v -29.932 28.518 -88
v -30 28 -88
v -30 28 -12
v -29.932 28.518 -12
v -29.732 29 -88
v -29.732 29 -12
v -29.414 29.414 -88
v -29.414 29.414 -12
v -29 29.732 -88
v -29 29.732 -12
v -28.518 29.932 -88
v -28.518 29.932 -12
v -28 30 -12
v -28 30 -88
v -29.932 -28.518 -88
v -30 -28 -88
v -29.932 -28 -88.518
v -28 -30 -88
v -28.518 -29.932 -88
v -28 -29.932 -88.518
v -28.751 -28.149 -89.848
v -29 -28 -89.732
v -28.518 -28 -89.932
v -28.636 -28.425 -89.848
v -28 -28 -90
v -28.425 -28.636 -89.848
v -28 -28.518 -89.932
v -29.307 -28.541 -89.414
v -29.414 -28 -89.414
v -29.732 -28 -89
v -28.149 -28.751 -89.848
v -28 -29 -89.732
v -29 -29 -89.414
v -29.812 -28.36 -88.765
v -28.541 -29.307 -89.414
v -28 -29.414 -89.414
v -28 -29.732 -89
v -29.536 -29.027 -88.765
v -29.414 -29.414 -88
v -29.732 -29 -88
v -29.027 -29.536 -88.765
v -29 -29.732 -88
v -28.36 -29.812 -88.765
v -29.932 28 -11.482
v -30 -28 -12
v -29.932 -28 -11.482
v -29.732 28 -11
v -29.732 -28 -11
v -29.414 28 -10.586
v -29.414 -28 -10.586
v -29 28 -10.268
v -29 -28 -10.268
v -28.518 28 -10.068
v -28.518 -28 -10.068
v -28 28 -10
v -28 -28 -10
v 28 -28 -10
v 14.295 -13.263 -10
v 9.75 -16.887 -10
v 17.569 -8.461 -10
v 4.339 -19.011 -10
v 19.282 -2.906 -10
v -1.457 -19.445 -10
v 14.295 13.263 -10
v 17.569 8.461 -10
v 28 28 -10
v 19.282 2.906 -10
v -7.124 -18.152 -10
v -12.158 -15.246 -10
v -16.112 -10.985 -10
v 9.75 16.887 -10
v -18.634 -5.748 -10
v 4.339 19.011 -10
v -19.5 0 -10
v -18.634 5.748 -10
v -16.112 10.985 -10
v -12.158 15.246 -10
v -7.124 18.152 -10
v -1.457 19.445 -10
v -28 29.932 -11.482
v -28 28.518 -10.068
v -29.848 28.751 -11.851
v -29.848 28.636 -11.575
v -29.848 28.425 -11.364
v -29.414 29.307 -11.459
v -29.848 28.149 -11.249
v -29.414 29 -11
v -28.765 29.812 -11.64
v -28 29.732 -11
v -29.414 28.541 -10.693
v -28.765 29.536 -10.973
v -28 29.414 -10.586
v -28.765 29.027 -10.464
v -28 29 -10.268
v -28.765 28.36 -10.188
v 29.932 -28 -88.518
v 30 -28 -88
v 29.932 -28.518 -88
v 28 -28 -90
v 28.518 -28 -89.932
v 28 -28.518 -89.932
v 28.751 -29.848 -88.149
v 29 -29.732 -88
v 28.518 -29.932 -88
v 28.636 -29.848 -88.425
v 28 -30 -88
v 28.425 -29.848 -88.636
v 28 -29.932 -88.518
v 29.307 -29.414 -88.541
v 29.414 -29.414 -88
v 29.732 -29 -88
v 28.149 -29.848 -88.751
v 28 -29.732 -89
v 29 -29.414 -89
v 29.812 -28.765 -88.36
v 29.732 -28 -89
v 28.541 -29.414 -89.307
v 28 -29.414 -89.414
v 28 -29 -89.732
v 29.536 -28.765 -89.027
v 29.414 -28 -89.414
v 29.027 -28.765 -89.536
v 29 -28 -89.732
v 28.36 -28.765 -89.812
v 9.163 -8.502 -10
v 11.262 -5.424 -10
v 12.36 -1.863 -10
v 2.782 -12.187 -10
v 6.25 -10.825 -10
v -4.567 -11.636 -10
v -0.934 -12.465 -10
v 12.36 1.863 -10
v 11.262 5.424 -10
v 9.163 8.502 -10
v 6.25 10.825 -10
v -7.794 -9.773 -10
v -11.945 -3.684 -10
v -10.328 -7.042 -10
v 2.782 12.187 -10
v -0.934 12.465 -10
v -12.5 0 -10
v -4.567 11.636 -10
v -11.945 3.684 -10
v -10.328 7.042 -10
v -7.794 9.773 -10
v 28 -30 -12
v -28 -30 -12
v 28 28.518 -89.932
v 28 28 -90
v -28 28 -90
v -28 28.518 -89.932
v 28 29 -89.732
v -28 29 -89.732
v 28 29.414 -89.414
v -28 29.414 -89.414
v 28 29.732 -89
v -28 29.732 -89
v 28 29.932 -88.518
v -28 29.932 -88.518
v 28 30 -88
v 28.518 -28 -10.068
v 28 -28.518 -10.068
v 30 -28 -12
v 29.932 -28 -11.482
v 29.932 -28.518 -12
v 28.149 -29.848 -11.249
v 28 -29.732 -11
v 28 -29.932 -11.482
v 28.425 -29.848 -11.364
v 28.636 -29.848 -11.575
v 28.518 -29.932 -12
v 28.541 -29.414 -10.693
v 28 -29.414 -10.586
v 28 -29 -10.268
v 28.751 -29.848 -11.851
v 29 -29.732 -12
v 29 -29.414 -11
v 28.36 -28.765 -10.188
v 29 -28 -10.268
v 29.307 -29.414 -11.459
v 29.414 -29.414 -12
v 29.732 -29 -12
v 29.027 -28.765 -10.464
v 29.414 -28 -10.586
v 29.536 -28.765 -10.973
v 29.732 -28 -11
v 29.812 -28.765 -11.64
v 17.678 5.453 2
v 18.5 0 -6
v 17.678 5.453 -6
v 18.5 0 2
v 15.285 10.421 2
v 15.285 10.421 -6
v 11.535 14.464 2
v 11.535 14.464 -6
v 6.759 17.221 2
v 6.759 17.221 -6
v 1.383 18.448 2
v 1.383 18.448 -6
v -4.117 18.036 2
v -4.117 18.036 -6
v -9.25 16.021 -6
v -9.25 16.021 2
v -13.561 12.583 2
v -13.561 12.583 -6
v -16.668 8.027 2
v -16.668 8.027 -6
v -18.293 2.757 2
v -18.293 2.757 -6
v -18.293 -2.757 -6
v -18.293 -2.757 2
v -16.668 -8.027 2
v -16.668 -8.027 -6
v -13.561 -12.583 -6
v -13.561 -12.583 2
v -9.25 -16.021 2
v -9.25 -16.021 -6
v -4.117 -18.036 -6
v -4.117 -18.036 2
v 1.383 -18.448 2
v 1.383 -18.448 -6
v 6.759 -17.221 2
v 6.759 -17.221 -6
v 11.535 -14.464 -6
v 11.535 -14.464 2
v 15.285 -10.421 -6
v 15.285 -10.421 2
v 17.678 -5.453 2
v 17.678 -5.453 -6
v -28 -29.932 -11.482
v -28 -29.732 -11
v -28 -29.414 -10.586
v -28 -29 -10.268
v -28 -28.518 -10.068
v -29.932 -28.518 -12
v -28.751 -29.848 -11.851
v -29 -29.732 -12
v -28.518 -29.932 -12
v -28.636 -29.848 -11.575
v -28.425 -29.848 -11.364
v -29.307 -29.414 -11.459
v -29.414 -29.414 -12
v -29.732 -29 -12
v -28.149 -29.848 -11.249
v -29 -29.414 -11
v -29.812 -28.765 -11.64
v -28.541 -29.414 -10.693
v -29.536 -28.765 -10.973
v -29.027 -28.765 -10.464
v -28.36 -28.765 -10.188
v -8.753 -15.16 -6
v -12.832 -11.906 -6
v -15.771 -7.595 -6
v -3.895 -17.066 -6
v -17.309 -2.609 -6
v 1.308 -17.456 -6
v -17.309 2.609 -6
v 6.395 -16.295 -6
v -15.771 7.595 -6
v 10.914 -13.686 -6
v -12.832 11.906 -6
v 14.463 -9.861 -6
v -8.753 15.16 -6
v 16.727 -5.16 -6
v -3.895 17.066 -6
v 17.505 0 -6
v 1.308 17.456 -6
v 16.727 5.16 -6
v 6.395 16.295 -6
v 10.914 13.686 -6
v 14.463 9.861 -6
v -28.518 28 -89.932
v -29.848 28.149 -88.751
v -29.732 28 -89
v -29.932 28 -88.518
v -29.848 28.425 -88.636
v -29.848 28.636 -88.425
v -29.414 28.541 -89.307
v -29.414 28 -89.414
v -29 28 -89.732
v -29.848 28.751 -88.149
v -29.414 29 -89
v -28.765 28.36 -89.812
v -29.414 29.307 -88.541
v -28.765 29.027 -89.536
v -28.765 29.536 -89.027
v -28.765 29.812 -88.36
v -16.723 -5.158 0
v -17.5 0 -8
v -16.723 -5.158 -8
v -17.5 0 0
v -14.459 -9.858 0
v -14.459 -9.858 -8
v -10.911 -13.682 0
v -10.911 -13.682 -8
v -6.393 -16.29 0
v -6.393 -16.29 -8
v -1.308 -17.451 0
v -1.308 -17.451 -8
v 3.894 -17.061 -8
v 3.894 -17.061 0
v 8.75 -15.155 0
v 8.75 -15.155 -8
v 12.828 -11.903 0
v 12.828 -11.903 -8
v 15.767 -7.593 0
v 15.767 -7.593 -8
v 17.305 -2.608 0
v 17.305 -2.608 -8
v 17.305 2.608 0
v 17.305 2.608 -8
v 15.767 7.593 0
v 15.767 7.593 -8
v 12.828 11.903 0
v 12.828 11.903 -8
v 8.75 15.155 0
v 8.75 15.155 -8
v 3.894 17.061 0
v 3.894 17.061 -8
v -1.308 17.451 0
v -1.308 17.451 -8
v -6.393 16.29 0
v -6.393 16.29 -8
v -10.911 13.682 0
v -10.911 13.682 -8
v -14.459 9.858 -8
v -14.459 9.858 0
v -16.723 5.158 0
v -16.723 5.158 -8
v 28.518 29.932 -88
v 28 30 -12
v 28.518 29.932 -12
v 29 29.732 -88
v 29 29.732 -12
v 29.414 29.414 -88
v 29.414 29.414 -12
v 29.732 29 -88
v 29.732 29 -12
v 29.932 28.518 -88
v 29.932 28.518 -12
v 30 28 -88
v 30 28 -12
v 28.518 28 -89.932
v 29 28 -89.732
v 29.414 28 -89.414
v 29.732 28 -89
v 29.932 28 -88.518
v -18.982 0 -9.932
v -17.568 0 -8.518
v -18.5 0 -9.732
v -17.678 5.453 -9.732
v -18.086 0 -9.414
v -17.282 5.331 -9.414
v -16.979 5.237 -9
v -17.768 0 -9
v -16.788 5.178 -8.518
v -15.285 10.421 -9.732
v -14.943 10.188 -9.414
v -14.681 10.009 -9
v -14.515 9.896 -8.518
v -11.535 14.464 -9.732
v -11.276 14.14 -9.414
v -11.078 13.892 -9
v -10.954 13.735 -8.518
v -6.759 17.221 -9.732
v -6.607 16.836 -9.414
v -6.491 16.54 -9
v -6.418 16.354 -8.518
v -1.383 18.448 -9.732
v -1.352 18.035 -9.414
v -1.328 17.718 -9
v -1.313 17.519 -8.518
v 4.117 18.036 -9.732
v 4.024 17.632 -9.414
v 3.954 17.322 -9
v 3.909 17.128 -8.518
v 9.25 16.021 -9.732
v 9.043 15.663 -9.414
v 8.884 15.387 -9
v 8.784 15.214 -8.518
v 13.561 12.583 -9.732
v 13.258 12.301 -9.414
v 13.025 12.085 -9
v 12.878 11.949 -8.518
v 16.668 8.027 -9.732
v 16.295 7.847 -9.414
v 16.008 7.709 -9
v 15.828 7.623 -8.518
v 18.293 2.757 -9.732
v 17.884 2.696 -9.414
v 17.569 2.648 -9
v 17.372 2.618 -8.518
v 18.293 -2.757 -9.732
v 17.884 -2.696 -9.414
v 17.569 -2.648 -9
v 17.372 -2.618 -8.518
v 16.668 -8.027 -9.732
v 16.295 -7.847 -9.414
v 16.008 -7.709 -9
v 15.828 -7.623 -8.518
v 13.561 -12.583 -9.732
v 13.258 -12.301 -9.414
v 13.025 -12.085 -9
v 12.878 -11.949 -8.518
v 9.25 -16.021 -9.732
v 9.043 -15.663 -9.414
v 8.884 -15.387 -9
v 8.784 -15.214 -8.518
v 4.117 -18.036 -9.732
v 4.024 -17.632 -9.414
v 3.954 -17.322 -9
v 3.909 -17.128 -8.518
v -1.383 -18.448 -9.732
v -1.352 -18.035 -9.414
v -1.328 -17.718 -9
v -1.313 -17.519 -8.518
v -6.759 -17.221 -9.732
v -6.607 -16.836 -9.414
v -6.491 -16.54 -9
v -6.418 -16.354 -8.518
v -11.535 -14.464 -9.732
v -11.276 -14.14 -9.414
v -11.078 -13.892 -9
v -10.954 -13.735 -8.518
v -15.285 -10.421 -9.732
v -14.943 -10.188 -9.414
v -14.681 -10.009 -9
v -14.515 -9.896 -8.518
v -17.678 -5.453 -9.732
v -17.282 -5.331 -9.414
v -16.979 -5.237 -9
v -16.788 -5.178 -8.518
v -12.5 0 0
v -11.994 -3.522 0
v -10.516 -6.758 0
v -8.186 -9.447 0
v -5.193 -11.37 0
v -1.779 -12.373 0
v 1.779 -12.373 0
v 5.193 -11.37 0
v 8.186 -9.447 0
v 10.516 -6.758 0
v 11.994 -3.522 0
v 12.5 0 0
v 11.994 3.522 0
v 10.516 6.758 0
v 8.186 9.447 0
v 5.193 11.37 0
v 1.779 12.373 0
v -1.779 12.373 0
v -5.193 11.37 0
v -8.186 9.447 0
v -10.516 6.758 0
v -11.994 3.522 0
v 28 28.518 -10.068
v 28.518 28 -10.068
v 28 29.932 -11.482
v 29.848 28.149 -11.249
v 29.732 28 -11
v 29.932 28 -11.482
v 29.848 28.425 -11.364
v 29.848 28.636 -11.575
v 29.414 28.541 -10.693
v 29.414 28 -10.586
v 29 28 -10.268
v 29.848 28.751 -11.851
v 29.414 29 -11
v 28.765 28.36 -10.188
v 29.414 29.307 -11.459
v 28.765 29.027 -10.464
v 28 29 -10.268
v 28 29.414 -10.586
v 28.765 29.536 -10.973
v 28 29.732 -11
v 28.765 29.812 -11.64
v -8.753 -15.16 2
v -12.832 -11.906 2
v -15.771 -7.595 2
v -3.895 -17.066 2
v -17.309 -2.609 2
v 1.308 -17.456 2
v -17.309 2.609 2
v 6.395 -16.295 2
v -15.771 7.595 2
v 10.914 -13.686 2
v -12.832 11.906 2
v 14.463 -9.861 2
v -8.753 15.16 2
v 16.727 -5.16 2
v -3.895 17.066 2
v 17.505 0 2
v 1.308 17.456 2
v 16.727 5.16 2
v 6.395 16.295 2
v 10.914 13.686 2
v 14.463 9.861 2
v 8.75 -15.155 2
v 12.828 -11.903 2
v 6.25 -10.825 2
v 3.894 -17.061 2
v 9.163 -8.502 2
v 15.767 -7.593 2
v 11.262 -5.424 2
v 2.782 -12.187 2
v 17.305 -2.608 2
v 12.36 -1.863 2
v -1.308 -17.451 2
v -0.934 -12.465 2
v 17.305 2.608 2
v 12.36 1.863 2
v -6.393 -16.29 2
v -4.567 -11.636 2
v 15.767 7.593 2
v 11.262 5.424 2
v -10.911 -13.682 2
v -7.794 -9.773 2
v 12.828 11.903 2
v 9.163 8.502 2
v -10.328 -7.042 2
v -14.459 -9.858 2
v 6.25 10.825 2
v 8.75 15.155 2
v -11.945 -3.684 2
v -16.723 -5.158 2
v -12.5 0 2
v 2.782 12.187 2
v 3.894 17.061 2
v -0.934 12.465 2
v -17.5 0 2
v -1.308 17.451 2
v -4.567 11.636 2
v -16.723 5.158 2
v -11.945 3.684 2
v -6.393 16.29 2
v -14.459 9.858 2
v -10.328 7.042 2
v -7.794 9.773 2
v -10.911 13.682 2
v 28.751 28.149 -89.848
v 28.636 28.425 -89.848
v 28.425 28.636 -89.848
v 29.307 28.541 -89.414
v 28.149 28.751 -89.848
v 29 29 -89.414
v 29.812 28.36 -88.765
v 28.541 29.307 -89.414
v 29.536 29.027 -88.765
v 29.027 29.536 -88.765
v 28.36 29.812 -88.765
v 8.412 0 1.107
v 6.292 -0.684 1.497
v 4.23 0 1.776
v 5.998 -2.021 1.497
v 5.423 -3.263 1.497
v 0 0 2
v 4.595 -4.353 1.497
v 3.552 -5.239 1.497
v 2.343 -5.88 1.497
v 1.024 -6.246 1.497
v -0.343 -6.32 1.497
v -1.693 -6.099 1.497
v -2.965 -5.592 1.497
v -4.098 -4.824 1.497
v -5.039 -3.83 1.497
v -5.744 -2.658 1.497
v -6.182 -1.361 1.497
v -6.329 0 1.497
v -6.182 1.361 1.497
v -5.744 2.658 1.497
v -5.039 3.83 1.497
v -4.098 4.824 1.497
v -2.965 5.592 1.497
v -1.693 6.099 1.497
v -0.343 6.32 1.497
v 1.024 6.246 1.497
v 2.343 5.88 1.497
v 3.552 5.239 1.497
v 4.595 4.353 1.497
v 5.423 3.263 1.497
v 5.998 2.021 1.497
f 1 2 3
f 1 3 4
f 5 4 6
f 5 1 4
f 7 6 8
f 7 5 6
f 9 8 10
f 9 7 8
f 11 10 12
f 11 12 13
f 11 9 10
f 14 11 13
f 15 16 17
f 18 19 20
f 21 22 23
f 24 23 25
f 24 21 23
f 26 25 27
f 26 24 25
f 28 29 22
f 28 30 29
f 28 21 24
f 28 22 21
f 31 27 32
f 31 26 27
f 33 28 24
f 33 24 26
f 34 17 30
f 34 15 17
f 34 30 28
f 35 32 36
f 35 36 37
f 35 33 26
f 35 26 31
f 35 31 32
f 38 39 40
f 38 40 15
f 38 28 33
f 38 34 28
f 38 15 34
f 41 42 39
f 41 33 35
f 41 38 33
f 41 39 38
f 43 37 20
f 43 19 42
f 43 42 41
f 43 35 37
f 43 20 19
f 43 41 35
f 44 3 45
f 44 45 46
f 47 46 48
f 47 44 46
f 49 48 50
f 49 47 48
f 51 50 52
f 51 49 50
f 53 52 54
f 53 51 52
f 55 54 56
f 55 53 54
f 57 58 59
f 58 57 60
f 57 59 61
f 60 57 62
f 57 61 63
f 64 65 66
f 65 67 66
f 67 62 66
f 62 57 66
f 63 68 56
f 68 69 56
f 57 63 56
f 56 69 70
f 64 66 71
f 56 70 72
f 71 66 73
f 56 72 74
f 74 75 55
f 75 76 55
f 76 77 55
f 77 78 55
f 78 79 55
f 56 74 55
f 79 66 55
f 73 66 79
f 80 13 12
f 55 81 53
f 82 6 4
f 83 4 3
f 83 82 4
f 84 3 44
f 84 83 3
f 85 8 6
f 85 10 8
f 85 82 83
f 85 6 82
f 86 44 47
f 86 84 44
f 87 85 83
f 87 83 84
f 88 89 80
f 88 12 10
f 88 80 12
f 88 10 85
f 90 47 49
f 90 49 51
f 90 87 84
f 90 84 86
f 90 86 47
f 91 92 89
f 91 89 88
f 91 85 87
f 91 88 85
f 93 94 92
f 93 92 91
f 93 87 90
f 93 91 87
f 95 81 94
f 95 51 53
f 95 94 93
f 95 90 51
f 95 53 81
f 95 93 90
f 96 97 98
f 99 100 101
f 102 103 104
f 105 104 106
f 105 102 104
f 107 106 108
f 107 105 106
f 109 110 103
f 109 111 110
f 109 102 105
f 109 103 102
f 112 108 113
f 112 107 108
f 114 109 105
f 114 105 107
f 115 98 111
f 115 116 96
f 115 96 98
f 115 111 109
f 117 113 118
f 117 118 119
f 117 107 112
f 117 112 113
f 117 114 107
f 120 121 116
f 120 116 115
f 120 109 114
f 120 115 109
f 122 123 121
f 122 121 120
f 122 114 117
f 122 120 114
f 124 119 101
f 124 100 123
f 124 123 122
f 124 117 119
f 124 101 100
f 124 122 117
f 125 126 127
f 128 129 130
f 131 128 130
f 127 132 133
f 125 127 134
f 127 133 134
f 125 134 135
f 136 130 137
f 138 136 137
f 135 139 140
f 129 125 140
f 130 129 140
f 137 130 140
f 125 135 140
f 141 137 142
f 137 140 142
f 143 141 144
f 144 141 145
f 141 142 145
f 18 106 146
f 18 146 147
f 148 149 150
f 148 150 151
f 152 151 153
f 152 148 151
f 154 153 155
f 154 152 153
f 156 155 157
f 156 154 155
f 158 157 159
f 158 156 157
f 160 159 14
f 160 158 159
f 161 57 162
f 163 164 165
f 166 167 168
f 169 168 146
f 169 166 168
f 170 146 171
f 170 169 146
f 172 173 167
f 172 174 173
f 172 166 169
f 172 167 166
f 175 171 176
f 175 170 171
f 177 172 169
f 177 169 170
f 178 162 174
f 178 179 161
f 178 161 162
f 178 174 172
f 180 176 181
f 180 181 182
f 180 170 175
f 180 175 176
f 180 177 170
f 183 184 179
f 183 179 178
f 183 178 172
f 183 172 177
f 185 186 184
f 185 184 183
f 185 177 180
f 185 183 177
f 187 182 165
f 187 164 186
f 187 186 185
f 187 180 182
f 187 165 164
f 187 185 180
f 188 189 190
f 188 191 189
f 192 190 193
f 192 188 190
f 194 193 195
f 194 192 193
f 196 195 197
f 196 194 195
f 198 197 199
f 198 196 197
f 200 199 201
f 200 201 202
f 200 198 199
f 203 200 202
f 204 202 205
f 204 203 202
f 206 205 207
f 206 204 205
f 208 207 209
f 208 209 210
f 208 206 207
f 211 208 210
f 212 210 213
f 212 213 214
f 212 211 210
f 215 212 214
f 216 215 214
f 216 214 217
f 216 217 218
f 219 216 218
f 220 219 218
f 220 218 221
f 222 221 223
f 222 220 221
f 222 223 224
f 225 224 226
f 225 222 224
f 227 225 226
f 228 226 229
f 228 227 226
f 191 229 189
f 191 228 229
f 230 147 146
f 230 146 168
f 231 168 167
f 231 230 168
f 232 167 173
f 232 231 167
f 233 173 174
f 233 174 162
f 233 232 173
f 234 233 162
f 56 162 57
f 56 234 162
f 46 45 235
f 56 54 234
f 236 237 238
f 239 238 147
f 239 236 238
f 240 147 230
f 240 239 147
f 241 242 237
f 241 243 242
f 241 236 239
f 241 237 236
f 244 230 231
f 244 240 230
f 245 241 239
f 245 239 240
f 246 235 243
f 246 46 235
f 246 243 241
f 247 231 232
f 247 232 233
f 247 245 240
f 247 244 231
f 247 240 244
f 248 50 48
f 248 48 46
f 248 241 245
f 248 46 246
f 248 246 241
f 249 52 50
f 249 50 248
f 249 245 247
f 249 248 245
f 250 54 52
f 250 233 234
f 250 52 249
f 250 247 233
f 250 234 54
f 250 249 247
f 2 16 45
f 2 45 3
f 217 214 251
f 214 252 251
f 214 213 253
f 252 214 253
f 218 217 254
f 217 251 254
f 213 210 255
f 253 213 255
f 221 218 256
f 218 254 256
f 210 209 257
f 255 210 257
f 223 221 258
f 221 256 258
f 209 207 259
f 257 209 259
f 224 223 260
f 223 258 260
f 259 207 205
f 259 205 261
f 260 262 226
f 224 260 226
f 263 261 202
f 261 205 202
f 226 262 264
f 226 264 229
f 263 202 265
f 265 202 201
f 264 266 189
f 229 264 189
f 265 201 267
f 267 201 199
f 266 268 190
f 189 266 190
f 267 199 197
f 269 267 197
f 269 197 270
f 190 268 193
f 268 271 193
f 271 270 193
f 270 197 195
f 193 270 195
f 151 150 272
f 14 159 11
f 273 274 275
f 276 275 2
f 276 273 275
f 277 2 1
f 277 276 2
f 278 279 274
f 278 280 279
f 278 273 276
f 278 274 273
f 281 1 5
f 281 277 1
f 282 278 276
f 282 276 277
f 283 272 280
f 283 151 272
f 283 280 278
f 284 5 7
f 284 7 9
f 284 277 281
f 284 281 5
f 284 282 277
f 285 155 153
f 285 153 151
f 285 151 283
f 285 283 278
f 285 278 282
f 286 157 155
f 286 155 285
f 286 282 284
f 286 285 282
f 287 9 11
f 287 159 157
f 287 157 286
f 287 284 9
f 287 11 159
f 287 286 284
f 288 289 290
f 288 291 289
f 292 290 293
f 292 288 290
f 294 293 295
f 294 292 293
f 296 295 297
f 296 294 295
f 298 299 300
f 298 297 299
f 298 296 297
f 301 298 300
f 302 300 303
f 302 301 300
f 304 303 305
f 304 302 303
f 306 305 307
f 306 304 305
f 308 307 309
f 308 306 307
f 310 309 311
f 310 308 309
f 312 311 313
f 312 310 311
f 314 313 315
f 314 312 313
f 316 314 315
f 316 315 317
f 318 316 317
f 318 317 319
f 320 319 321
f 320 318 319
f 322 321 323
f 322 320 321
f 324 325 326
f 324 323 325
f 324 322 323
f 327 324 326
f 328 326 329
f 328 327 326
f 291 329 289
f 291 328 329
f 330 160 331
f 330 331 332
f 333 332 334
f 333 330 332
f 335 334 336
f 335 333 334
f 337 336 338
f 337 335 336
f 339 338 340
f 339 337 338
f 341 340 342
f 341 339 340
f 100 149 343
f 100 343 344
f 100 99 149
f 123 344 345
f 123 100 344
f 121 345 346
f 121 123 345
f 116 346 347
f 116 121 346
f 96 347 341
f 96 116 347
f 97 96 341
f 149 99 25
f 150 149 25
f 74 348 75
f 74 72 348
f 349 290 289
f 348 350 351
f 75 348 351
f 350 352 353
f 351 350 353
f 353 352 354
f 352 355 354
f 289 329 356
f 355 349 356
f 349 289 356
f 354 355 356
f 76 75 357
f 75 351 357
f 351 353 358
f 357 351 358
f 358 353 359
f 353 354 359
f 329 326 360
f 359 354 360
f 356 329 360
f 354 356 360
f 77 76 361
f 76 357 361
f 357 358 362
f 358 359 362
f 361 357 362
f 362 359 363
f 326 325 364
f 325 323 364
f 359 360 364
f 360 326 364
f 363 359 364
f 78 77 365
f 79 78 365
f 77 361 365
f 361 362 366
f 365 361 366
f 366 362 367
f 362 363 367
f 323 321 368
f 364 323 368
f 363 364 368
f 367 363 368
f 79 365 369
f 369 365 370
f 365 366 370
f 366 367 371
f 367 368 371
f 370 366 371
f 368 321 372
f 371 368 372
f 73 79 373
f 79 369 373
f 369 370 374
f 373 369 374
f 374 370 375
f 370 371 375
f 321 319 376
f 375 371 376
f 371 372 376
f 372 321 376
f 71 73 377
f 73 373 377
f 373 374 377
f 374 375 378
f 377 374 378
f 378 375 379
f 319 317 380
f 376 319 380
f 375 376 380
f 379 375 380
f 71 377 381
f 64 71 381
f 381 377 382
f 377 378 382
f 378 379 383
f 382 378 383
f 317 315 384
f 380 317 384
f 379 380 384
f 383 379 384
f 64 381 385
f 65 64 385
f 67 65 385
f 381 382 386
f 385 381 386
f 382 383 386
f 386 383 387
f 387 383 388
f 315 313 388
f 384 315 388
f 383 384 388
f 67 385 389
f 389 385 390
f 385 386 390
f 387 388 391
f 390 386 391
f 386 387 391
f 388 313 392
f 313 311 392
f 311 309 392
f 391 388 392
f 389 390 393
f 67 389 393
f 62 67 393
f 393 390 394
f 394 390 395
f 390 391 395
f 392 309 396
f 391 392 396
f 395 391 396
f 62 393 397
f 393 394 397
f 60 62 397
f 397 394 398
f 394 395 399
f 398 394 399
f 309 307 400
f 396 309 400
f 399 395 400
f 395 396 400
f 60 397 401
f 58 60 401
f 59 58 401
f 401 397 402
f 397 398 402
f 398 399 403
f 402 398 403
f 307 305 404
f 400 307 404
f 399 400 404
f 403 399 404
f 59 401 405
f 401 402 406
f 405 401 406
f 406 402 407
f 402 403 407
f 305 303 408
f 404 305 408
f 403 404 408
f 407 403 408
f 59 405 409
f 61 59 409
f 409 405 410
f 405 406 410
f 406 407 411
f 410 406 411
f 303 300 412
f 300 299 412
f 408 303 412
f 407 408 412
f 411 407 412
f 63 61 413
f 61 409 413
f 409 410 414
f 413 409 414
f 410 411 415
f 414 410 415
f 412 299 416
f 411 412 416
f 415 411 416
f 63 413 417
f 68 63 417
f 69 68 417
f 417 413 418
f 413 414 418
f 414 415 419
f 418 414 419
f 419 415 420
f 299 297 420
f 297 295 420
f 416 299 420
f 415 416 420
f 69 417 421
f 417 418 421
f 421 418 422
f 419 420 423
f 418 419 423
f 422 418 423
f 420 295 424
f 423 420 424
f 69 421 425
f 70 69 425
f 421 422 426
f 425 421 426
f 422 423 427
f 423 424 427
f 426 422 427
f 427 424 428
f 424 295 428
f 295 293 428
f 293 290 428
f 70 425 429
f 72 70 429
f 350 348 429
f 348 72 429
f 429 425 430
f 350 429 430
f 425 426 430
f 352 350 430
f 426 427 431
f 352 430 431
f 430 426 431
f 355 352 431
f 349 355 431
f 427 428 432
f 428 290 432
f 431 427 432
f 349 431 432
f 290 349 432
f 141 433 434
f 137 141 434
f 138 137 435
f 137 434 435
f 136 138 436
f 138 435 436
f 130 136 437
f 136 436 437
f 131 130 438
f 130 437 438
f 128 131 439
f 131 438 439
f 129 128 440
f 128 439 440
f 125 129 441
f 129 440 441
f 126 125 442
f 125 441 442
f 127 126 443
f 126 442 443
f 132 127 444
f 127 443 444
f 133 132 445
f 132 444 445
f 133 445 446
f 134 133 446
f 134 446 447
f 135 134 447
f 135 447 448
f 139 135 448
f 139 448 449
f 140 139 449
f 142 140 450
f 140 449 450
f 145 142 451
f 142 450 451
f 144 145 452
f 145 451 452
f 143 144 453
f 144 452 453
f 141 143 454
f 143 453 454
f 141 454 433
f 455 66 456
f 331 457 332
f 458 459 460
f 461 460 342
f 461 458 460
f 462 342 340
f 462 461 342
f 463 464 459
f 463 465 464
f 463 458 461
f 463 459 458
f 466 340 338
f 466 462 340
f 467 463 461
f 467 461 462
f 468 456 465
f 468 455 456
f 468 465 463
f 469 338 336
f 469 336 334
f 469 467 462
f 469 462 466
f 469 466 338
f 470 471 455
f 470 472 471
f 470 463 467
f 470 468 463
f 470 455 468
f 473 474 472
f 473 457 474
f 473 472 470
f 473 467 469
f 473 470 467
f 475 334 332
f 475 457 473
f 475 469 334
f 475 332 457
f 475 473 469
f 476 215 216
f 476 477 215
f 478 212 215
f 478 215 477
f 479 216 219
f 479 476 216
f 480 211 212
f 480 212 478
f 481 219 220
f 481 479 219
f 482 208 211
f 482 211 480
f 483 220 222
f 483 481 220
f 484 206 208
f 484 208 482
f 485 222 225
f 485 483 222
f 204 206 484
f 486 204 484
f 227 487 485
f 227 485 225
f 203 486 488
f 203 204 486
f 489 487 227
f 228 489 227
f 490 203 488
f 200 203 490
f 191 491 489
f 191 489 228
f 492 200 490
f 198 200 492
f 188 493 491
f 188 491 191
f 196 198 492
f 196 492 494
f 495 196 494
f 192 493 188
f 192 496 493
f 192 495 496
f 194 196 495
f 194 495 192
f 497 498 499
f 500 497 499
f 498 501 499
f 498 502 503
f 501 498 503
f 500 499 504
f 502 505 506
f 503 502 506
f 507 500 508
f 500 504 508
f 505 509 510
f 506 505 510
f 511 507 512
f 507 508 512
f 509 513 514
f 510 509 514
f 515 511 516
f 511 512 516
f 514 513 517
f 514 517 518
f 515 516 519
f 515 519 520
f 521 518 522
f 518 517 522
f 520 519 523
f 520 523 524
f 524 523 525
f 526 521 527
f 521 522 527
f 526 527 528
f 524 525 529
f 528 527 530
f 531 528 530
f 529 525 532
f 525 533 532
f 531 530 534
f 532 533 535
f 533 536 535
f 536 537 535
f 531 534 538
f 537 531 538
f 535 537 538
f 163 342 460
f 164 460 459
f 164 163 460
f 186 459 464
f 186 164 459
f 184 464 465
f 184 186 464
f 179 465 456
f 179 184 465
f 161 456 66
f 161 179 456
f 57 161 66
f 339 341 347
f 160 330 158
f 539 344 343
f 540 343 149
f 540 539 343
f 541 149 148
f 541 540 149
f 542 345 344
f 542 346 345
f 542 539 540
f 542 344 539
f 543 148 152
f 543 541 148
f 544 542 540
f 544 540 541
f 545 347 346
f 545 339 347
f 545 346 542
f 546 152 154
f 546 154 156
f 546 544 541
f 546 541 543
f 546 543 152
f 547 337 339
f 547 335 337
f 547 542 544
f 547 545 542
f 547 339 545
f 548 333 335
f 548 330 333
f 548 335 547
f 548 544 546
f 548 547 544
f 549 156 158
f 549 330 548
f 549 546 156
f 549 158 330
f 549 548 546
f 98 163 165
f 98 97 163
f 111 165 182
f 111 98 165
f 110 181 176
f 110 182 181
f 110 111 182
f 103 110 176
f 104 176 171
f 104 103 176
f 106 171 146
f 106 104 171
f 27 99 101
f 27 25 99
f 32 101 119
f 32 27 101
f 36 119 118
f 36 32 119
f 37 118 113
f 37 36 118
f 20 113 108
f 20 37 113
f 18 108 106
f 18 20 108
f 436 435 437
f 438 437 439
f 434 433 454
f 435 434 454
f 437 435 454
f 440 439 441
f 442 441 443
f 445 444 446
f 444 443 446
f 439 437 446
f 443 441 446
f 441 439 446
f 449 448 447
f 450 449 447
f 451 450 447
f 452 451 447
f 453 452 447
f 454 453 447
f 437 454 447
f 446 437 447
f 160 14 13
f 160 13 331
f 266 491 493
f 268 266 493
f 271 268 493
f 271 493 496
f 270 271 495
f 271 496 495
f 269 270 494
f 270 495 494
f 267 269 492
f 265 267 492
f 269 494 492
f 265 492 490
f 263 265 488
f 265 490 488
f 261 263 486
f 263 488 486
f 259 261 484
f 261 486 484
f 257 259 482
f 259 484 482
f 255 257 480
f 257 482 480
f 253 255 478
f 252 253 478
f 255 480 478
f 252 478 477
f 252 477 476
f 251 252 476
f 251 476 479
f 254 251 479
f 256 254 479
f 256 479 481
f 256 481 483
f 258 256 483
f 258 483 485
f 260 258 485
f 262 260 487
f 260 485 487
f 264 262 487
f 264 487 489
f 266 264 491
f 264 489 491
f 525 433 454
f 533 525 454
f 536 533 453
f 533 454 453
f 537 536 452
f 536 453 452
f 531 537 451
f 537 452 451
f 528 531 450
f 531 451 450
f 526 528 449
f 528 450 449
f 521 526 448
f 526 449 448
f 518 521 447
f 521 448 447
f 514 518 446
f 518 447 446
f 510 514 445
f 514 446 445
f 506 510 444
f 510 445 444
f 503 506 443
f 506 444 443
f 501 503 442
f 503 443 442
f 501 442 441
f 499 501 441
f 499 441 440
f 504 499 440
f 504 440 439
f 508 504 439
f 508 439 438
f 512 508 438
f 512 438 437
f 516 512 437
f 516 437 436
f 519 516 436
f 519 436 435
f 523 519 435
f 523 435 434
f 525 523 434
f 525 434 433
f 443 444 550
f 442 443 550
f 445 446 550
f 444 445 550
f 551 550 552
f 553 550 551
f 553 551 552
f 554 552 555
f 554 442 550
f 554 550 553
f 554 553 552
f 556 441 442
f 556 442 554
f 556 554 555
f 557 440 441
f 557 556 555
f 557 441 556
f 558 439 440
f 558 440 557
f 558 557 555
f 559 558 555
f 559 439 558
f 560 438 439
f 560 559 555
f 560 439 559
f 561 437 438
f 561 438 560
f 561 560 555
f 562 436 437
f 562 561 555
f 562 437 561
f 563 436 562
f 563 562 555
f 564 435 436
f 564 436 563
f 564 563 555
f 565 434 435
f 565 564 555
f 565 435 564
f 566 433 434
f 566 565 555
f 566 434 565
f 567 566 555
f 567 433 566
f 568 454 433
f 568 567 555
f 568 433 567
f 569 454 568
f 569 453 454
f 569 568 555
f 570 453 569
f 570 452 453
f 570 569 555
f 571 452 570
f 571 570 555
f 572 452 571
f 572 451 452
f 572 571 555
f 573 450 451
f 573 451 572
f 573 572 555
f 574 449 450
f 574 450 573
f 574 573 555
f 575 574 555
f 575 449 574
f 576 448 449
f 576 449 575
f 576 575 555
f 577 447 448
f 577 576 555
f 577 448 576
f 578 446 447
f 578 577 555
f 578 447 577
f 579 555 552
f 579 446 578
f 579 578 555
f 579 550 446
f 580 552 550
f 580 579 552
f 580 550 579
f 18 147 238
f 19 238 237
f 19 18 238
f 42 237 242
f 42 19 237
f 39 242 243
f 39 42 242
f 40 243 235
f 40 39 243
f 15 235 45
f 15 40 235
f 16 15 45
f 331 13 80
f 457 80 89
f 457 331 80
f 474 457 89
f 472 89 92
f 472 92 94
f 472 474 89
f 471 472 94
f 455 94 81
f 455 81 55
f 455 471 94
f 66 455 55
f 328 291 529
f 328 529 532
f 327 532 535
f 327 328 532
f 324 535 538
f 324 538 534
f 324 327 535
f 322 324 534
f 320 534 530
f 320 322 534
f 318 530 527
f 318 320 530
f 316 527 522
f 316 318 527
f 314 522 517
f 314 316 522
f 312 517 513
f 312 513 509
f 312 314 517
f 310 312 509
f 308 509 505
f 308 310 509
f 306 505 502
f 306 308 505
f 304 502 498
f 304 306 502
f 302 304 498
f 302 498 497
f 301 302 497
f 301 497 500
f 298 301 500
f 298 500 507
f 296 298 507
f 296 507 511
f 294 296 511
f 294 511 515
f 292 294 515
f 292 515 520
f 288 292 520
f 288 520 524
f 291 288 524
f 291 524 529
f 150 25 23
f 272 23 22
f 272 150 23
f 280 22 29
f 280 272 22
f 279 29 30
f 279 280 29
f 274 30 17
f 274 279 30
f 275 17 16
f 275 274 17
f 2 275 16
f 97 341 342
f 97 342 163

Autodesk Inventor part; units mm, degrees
ref_plane "YZ Plane" through (0, 0, 0) normal (1, 0, 0) x (0, 1, 0)
ref_plane "XZ Plane" through (0, 0, 0) normal (0, 1, 0) x (-1, 0, 0)
ref_plane "XY Plane" through (0, 0, 0) normal (0, 0, 1) x (1, 0, 0)
sketch "Sketch5" plane through (0, 0, 0) normal (0, 1, 0) x (-1, 0, 0)
  line L0 (0, 0) -> (0, 2)
  circle A0 centre (0, -38.0625) radius 40.0625
  line L1 (0, 0) -> (12.5, 0)
  line L2 (0, 0) -> (-12.5, 0)
  dimension "d31" = 2
  dimension "d32" = 12.5
  dimension "d33" = 12.5
revolve "Revolution1" add sketch "Sketch5" angle 360 about axis through (0, 0, 0) along (0, 0, 1) contours L2 A0 L0
sketch "Sketch6" plane through (0, 0, 0) normal (0, 0, -1) x (-1, 0, 0)
  circle A0 centre (0, 0) radius 12.5
  circle A1 centre (0, 0) radius 17.5
  dimension "d35" = 25
  dimension "d36" = 35
extrude "Extrusion5" add sketch "Sketch6" along normal blind 10 and the other way blind 2
sketch "Sketch7" plane through (0, 0, -10) normal (0, 0, -1) x (-1, 0, 0)
  line L0 (-30, -30) -> (30, -30)
  line L1 (30, -30) -> (30, 30)
  line L2 (30, 30) -> (-30, 30)
  line L3 (-30, 30) -> (-30, -30)
  line L4 (-30, -30) -> (30, 30) construction
  line L5 (30, -30) -> (-30, 30) construction
  point P0 (0, 0)
  dimension "d41" = 60
  dimension "d42" = 60
extrude "Extrusion6" add sketch "Sketch7" along normal blind 80
fillet "Fillet1" radius 2 13 edges at (0, 30, -10) (30, 0, -10) (30, 30, -50) (30, 0, -90) (30, -30, -50) (0, 30, -90) (-30, 30, -50) (-30, 0, -10) (17.5, 0, -10) (0, -30, -10) (-30, -30, -50) (0, -30, -90) (-30, 0, -90)
sketch "Sketch8" plane through (0, 0, 2) normal (0, 0, 1) x (1, 0, 0)
  circle A0 centre (0, 0) radius 17.505
  circle A1 centre (0, 0) radius 18.5
  dimension "d46" = 35.01
  dimension "d47" = 37
extrude "Extrusion7" add sketch "Sketch8" against normal blind 8
properties part number "Power Meter"
